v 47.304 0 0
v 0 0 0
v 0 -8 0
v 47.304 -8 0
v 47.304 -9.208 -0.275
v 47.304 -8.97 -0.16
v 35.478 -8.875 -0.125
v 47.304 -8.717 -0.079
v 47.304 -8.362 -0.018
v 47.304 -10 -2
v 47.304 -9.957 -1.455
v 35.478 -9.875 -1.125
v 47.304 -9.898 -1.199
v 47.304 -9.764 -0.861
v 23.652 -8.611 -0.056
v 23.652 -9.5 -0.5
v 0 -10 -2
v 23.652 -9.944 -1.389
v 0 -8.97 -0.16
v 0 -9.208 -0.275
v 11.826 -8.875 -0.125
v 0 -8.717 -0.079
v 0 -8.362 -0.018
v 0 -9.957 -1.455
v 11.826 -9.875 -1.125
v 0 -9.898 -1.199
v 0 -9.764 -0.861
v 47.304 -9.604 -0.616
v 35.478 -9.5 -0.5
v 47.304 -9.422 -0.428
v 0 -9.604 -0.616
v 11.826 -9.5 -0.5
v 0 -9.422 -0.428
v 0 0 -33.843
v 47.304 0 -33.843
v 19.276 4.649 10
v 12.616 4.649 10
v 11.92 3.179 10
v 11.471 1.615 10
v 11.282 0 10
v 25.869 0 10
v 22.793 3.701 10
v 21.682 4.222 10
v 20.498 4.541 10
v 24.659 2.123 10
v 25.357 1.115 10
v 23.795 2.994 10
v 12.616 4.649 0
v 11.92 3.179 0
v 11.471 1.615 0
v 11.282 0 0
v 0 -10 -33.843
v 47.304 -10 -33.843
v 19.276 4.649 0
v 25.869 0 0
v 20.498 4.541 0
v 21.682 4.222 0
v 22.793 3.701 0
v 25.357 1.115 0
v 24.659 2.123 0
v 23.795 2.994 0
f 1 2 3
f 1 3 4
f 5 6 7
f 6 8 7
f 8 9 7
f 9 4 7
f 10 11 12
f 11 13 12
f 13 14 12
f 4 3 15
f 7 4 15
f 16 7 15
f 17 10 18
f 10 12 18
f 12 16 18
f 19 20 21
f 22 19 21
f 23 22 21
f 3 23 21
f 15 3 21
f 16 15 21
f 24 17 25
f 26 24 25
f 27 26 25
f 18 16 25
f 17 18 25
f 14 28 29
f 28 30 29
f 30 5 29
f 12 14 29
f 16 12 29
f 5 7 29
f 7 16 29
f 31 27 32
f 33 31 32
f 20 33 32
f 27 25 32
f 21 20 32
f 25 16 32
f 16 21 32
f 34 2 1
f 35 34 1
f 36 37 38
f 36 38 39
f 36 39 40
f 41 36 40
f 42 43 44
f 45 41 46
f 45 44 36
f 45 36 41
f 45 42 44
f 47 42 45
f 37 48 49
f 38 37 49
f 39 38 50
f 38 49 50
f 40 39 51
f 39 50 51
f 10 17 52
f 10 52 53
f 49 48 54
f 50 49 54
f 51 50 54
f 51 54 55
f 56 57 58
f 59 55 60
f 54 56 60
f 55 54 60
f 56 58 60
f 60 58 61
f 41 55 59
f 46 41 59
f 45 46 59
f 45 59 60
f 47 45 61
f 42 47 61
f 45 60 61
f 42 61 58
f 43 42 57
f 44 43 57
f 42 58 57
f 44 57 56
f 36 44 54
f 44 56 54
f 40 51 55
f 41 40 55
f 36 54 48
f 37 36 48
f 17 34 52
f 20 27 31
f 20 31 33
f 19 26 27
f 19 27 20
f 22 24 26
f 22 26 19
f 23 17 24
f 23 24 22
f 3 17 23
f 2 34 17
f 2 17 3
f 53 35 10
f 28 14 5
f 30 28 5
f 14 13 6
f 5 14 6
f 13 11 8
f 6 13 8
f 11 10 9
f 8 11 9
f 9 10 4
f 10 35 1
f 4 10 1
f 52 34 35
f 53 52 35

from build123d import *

# Parameters (mm, degrees)
F0_W        = 47.3044924438
F0_H        = 33.8430907577
F1_DEPTH    = 10
F3_DEPTH    = 10
F4_T1_DEPTH = 57.3044924438


# Not quite as in the source:
# - a fillet or chamfer that OpenCascade refuses, or shapes differently, is made with other operations: its cross-section is extruded or revolved along the edge and cut away or added


with BuildPart() as f1:
    # F0 (on Front) → F1 (new body)
    with BuildSketch(Plane.XZ):
        with Locations((23.6522462219, -16.9215453789)):
            Rectangle(F0_W, F0_H)
    extrude(amount=F1_DEPTH)

    # F4: fillet of radius 2 on 1 edges, made by hand

    # F4_s2 → F4_t1 (cut)
    with BuildSketch(Plane.YZ.offset(-5)):
        with BuildLine():
            add(Edge.make_bspline(
                [(-8, 0), (-10, 0), (-10, -2)],
                knots=[0, 0, 0, 1, 1, 1], degree=2, weights=[1, 1, 1]))
            Line((-10, -2), (-10, 0))
            Line((-10, 0), (-8, 0))
        make_face()
    extrude(amount=F4_T1_DEPTH, mode=Mode.SUBTRACT)


with BuildPart() as f3:
    # F2 (on face) → F3 (new body)
    with BuildSketch(Plane.XY):
        with BuildLine():
            Line((19.2758429274, 4.6487802366), (12.6155888896, 4.6487802366))
            ThreePointArc((12.6155888896, 4.6487802366), (11.6635328342, 2.4062237394), (11.2820125968, 0))
            Line((11.2820125968, 0), (25.8691551166, 0))
            ThreePointArc((25.8691551166, 0), (23.3095423248, 3.3697302602), (19.2758429274, 4.6487802366))
        make_face()
    extrude(amount=F3_DEPTH)


solid = Compound([f1.part, f3.part])
